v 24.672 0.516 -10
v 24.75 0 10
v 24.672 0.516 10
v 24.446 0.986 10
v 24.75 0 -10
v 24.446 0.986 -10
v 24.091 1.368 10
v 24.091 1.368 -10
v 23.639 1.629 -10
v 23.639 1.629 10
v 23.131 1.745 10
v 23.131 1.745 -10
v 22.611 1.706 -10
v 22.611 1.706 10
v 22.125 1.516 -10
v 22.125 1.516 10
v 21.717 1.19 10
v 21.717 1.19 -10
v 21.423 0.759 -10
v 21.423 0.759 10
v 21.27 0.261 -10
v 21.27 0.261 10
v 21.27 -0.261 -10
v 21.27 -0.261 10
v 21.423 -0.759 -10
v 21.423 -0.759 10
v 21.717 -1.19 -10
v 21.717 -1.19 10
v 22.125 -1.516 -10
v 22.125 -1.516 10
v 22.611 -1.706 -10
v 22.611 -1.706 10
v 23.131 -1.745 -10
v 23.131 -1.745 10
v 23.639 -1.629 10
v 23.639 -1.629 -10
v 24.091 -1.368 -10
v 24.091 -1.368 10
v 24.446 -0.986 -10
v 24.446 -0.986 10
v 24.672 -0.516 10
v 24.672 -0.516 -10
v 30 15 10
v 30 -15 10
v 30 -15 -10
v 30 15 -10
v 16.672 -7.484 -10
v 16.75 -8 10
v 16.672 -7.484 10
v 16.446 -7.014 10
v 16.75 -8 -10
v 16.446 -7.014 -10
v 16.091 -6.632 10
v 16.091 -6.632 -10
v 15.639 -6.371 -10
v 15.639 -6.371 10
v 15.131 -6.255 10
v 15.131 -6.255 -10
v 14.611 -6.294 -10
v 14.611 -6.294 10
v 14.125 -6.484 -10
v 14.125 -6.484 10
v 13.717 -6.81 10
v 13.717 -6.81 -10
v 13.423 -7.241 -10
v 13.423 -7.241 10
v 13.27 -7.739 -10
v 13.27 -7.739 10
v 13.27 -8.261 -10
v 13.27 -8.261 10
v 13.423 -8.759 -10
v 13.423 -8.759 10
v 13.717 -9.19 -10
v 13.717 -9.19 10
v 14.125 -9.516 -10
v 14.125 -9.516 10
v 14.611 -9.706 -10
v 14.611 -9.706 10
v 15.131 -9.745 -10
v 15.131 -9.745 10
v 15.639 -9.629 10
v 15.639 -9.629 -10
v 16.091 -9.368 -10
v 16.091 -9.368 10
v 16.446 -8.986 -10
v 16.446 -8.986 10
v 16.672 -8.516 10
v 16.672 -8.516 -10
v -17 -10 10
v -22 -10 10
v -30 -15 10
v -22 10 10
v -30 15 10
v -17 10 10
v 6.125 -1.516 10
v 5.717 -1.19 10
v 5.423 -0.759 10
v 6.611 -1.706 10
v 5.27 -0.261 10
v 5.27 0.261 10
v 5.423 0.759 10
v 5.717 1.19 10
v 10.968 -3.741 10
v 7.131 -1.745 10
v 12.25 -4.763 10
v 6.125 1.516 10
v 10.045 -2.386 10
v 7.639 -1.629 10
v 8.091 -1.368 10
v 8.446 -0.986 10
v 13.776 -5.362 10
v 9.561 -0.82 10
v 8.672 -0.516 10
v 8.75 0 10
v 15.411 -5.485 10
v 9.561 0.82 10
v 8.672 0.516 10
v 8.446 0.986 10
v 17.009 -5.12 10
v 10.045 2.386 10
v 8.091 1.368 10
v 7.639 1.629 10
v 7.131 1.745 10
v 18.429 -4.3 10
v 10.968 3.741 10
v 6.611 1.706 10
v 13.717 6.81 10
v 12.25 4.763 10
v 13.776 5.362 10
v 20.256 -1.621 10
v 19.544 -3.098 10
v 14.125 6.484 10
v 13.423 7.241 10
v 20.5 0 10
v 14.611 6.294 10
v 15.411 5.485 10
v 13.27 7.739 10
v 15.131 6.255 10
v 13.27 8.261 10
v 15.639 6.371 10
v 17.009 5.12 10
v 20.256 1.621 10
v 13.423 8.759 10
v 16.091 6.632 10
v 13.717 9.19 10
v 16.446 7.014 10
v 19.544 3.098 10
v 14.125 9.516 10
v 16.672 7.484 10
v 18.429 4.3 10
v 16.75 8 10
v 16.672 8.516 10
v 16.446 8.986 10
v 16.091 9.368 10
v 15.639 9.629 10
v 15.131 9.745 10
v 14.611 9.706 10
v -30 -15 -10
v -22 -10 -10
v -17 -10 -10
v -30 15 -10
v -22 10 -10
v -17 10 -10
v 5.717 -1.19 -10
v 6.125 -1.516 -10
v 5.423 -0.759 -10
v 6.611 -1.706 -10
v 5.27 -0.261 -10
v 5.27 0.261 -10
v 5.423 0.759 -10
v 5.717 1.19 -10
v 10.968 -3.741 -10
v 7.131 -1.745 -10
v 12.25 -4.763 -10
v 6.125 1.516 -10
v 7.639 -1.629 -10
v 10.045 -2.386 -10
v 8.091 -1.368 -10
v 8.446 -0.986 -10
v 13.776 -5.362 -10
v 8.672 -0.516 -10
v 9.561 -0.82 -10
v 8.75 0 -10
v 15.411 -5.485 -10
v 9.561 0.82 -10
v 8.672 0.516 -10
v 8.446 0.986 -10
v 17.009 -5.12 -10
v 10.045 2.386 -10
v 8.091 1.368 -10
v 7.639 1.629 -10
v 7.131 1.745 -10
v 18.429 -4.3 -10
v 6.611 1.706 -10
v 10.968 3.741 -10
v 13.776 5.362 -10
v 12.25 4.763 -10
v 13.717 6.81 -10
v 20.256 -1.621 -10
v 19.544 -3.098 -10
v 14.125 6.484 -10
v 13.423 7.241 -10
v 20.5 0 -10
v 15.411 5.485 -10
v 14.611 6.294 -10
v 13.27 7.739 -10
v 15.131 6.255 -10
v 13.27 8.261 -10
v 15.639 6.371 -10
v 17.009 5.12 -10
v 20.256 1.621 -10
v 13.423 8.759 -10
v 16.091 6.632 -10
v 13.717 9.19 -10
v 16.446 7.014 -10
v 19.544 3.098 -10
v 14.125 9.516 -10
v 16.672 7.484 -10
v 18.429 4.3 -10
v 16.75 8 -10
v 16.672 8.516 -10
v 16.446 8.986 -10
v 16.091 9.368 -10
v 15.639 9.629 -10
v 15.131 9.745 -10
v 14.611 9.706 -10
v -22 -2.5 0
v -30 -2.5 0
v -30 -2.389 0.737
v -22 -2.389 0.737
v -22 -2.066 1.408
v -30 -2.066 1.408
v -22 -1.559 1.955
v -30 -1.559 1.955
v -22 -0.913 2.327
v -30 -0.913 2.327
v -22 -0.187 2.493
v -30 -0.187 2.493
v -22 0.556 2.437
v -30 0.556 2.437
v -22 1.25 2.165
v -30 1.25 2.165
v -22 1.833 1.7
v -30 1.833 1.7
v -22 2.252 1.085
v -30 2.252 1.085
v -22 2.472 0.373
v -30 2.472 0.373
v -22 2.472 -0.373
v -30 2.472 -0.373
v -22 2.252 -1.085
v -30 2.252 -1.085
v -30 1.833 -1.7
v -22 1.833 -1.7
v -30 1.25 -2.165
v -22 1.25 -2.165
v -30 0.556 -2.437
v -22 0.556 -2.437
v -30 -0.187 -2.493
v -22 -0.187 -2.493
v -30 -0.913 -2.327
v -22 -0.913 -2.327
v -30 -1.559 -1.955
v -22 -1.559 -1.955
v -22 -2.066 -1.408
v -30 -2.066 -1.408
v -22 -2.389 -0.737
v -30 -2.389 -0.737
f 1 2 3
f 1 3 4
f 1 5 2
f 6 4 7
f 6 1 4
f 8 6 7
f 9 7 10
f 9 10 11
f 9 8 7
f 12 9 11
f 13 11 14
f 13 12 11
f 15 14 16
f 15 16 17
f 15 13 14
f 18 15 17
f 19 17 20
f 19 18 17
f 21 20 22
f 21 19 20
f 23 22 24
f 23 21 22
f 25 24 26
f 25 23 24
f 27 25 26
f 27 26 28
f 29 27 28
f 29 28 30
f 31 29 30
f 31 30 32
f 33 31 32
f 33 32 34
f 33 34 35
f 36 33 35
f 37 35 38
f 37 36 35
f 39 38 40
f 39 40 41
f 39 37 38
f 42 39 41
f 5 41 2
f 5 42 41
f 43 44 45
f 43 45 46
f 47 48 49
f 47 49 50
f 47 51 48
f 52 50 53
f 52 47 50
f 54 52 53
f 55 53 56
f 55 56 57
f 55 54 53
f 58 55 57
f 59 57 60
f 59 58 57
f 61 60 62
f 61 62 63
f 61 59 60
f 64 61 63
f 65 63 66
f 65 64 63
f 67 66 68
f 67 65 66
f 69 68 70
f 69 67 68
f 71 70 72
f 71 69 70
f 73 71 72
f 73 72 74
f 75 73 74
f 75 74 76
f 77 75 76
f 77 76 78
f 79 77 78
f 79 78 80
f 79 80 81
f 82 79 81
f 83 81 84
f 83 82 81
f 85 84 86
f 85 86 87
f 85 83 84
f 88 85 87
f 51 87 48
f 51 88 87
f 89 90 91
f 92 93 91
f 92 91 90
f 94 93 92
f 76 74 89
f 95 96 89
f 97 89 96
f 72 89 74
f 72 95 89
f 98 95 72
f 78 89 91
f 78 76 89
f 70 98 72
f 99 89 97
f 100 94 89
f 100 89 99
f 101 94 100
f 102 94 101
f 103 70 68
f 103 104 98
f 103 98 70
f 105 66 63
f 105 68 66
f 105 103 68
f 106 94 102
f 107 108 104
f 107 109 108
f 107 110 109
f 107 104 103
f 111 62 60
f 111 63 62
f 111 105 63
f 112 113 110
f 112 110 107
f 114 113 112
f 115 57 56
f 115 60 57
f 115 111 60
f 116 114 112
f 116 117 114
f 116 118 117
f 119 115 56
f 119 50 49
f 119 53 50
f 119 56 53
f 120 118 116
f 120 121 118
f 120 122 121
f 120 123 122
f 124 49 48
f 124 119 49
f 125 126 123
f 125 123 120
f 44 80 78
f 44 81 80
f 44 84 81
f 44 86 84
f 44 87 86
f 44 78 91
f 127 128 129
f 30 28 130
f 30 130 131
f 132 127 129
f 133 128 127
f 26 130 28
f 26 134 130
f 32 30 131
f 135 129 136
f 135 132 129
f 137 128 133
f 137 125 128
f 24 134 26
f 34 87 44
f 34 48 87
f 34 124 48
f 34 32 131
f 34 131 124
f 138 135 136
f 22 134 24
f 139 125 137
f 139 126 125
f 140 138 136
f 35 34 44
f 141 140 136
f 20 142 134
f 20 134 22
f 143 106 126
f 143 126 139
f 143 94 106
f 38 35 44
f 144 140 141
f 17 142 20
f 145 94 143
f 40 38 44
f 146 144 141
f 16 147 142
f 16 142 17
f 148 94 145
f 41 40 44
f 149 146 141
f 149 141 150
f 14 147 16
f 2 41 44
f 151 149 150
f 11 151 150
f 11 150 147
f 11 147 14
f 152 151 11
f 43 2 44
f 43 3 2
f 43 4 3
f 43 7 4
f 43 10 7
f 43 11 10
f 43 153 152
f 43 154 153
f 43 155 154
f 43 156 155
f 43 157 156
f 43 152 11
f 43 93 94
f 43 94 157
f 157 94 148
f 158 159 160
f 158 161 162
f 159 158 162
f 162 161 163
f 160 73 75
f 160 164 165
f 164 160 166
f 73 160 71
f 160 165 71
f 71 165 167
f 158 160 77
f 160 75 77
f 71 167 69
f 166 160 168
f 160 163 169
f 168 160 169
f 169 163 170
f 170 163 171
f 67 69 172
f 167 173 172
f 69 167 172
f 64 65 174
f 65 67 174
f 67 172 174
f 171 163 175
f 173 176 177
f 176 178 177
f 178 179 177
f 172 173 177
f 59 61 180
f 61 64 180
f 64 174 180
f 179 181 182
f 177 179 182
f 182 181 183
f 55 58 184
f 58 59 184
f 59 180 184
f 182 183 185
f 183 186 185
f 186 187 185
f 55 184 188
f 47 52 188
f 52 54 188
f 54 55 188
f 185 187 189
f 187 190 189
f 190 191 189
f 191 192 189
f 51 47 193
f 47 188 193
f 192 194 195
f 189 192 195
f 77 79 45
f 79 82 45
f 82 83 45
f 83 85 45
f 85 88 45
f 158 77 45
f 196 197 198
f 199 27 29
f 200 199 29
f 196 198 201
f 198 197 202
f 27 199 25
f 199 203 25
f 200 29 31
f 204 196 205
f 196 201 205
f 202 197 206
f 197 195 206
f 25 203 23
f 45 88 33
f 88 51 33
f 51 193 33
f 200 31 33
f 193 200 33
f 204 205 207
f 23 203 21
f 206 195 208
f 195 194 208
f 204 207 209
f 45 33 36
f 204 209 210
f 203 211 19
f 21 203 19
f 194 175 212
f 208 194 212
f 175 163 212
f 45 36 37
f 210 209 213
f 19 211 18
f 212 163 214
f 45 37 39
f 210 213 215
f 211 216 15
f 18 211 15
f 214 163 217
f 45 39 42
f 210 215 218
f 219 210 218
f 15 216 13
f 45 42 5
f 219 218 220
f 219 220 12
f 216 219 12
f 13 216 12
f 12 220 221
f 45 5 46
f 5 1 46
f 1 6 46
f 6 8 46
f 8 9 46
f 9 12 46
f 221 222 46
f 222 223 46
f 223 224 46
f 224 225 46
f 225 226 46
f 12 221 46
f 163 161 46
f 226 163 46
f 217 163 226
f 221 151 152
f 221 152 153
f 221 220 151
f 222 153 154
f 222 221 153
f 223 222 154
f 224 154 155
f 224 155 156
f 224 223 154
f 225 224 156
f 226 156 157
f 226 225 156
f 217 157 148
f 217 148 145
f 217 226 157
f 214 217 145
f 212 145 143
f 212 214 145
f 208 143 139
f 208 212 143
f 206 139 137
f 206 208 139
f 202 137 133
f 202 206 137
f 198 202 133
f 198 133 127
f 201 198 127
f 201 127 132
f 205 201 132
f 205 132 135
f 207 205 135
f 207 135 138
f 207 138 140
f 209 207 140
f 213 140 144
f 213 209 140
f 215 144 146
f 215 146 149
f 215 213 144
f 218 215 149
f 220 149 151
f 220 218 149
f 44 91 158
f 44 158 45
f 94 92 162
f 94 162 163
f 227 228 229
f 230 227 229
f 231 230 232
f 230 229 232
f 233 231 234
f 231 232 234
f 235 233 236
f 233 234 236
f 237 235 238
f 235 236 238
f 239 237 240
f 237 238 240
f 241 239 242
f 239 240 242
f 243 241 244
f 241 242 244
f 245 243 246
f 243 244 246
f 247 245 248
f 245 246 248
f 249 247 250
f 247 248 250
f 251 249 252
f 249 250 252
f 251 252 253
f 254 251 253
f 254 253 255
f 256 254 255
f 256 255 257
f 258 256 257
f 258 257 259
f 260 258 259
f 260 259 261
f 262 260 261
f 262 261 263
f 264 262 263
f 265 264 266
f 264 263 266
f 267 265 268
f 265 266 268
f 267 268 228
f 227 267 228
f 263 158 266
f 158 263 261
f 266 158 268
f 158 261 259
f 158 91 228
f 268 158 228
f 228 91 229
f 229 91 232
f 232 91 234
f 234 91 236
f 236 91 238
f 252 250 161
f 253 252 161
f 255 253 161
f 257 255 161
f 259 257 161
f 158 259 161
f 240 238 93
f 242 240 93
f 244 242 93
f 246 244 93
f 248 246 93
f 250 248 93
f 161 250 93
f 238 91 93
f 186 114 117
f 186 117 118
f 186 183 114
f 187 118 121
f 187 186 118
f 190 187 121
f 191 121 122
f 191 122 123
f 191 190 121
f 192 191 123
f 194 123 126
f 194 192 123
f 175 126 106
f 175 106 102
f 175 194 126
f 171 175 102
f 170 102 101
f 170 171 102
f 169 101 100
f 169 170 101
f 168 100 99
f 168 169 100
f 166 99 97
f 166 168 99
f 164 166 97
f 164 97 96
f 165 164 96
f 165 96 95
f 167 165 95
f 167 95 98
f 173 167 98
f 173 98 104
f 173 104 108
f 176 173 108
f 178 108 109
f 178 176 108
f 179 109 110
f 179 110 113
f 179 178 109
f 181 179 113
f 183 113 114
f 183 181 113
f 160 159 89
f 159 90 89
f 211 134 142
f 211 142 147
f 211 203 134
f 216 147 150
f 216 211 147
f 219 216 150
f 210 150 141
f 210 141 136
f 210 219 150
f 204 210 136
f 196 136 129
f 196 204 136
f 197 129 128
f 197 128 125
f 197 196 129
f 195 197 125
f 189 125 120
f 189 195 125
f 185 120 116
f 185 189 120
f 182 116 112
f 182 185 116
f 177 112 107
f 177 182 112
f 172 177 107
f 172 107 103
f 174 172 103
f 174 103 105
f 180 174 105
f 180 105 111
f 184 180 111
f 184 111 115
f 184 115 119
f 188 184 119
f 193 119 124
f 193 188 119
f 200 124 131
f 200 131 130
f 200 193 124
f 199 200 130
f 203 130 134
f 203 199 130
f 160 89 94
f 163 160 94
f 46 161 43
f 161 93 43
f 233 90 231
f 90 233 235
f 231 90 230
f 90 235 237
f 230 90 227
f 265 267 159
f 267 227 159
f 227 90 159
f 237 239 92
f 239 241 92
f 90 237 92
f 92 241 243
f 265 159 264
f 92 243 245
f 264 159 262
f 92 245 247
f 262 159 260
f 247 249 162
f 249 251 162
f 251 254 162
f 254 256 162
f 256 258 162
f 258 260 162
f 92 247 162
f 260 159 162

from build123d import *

# Parameters (mm, degrees)
SKETCH1_W           = 60
SKETCH1_H           = 30
SKETCH1_R           = 5.5
SKETCH1_R_2         = 1.75
SKETCH1_W_2         = 5
SKETCH1_H_2         = 20
BOSS_EXTRUDE1_DEPTH = 10
SKETCH2_R           = 2.5
CUT_EXTRUDE1_DEPTH  = 8


with BuildPart() as part:
    # Sketch1 → Boss-Extrude1 (new, symmetric)
    with BuildSketch(Plane.XY):
        Rectangle(SKETCH1_W, SKETCH1_H)
        with Locations((15, 0)):
            Circle(SKETCH1_R, mode=Mode.SUBTRACT)
        with Locations((15, 8)):
            Circle(SKETCH1_R_2, mode=Mode.SUBTRACT)
        with Locations((23, 0)):
            Circle(SKETCH1_R_2, mode=Mode.SUBTRACT)
        with Locations((15, -8)):
            Circle(SKETCH1_R_2, mode=Mode.SUBTRACT)
        with Locations((7, 0)):
            Circle(SKETCH1_R_2, mode=Mode.SUBTRACT)
        with Locations((-19.5, 0)):
            Rectangle(SKETCH1_W_2, SKETCH1_H_2, mode=Mode.SUBTRACT)
    extrude(amount=BOSS_EXTRUDE1_DEPTH, both=True)

    # Sketch2 → Cut-Extrude1 (cut)
    with BuildSketch(Plane.ZY.offset(30)):
        with Locations(Location((0, 0, 0), (0, 0, 270))):
            Circle(SKETCH2_R)
    extrude(amount=-CUT_EXTRUDE1_DEPTH, mode=Mode.SUBTRACT)


solid = part.part
